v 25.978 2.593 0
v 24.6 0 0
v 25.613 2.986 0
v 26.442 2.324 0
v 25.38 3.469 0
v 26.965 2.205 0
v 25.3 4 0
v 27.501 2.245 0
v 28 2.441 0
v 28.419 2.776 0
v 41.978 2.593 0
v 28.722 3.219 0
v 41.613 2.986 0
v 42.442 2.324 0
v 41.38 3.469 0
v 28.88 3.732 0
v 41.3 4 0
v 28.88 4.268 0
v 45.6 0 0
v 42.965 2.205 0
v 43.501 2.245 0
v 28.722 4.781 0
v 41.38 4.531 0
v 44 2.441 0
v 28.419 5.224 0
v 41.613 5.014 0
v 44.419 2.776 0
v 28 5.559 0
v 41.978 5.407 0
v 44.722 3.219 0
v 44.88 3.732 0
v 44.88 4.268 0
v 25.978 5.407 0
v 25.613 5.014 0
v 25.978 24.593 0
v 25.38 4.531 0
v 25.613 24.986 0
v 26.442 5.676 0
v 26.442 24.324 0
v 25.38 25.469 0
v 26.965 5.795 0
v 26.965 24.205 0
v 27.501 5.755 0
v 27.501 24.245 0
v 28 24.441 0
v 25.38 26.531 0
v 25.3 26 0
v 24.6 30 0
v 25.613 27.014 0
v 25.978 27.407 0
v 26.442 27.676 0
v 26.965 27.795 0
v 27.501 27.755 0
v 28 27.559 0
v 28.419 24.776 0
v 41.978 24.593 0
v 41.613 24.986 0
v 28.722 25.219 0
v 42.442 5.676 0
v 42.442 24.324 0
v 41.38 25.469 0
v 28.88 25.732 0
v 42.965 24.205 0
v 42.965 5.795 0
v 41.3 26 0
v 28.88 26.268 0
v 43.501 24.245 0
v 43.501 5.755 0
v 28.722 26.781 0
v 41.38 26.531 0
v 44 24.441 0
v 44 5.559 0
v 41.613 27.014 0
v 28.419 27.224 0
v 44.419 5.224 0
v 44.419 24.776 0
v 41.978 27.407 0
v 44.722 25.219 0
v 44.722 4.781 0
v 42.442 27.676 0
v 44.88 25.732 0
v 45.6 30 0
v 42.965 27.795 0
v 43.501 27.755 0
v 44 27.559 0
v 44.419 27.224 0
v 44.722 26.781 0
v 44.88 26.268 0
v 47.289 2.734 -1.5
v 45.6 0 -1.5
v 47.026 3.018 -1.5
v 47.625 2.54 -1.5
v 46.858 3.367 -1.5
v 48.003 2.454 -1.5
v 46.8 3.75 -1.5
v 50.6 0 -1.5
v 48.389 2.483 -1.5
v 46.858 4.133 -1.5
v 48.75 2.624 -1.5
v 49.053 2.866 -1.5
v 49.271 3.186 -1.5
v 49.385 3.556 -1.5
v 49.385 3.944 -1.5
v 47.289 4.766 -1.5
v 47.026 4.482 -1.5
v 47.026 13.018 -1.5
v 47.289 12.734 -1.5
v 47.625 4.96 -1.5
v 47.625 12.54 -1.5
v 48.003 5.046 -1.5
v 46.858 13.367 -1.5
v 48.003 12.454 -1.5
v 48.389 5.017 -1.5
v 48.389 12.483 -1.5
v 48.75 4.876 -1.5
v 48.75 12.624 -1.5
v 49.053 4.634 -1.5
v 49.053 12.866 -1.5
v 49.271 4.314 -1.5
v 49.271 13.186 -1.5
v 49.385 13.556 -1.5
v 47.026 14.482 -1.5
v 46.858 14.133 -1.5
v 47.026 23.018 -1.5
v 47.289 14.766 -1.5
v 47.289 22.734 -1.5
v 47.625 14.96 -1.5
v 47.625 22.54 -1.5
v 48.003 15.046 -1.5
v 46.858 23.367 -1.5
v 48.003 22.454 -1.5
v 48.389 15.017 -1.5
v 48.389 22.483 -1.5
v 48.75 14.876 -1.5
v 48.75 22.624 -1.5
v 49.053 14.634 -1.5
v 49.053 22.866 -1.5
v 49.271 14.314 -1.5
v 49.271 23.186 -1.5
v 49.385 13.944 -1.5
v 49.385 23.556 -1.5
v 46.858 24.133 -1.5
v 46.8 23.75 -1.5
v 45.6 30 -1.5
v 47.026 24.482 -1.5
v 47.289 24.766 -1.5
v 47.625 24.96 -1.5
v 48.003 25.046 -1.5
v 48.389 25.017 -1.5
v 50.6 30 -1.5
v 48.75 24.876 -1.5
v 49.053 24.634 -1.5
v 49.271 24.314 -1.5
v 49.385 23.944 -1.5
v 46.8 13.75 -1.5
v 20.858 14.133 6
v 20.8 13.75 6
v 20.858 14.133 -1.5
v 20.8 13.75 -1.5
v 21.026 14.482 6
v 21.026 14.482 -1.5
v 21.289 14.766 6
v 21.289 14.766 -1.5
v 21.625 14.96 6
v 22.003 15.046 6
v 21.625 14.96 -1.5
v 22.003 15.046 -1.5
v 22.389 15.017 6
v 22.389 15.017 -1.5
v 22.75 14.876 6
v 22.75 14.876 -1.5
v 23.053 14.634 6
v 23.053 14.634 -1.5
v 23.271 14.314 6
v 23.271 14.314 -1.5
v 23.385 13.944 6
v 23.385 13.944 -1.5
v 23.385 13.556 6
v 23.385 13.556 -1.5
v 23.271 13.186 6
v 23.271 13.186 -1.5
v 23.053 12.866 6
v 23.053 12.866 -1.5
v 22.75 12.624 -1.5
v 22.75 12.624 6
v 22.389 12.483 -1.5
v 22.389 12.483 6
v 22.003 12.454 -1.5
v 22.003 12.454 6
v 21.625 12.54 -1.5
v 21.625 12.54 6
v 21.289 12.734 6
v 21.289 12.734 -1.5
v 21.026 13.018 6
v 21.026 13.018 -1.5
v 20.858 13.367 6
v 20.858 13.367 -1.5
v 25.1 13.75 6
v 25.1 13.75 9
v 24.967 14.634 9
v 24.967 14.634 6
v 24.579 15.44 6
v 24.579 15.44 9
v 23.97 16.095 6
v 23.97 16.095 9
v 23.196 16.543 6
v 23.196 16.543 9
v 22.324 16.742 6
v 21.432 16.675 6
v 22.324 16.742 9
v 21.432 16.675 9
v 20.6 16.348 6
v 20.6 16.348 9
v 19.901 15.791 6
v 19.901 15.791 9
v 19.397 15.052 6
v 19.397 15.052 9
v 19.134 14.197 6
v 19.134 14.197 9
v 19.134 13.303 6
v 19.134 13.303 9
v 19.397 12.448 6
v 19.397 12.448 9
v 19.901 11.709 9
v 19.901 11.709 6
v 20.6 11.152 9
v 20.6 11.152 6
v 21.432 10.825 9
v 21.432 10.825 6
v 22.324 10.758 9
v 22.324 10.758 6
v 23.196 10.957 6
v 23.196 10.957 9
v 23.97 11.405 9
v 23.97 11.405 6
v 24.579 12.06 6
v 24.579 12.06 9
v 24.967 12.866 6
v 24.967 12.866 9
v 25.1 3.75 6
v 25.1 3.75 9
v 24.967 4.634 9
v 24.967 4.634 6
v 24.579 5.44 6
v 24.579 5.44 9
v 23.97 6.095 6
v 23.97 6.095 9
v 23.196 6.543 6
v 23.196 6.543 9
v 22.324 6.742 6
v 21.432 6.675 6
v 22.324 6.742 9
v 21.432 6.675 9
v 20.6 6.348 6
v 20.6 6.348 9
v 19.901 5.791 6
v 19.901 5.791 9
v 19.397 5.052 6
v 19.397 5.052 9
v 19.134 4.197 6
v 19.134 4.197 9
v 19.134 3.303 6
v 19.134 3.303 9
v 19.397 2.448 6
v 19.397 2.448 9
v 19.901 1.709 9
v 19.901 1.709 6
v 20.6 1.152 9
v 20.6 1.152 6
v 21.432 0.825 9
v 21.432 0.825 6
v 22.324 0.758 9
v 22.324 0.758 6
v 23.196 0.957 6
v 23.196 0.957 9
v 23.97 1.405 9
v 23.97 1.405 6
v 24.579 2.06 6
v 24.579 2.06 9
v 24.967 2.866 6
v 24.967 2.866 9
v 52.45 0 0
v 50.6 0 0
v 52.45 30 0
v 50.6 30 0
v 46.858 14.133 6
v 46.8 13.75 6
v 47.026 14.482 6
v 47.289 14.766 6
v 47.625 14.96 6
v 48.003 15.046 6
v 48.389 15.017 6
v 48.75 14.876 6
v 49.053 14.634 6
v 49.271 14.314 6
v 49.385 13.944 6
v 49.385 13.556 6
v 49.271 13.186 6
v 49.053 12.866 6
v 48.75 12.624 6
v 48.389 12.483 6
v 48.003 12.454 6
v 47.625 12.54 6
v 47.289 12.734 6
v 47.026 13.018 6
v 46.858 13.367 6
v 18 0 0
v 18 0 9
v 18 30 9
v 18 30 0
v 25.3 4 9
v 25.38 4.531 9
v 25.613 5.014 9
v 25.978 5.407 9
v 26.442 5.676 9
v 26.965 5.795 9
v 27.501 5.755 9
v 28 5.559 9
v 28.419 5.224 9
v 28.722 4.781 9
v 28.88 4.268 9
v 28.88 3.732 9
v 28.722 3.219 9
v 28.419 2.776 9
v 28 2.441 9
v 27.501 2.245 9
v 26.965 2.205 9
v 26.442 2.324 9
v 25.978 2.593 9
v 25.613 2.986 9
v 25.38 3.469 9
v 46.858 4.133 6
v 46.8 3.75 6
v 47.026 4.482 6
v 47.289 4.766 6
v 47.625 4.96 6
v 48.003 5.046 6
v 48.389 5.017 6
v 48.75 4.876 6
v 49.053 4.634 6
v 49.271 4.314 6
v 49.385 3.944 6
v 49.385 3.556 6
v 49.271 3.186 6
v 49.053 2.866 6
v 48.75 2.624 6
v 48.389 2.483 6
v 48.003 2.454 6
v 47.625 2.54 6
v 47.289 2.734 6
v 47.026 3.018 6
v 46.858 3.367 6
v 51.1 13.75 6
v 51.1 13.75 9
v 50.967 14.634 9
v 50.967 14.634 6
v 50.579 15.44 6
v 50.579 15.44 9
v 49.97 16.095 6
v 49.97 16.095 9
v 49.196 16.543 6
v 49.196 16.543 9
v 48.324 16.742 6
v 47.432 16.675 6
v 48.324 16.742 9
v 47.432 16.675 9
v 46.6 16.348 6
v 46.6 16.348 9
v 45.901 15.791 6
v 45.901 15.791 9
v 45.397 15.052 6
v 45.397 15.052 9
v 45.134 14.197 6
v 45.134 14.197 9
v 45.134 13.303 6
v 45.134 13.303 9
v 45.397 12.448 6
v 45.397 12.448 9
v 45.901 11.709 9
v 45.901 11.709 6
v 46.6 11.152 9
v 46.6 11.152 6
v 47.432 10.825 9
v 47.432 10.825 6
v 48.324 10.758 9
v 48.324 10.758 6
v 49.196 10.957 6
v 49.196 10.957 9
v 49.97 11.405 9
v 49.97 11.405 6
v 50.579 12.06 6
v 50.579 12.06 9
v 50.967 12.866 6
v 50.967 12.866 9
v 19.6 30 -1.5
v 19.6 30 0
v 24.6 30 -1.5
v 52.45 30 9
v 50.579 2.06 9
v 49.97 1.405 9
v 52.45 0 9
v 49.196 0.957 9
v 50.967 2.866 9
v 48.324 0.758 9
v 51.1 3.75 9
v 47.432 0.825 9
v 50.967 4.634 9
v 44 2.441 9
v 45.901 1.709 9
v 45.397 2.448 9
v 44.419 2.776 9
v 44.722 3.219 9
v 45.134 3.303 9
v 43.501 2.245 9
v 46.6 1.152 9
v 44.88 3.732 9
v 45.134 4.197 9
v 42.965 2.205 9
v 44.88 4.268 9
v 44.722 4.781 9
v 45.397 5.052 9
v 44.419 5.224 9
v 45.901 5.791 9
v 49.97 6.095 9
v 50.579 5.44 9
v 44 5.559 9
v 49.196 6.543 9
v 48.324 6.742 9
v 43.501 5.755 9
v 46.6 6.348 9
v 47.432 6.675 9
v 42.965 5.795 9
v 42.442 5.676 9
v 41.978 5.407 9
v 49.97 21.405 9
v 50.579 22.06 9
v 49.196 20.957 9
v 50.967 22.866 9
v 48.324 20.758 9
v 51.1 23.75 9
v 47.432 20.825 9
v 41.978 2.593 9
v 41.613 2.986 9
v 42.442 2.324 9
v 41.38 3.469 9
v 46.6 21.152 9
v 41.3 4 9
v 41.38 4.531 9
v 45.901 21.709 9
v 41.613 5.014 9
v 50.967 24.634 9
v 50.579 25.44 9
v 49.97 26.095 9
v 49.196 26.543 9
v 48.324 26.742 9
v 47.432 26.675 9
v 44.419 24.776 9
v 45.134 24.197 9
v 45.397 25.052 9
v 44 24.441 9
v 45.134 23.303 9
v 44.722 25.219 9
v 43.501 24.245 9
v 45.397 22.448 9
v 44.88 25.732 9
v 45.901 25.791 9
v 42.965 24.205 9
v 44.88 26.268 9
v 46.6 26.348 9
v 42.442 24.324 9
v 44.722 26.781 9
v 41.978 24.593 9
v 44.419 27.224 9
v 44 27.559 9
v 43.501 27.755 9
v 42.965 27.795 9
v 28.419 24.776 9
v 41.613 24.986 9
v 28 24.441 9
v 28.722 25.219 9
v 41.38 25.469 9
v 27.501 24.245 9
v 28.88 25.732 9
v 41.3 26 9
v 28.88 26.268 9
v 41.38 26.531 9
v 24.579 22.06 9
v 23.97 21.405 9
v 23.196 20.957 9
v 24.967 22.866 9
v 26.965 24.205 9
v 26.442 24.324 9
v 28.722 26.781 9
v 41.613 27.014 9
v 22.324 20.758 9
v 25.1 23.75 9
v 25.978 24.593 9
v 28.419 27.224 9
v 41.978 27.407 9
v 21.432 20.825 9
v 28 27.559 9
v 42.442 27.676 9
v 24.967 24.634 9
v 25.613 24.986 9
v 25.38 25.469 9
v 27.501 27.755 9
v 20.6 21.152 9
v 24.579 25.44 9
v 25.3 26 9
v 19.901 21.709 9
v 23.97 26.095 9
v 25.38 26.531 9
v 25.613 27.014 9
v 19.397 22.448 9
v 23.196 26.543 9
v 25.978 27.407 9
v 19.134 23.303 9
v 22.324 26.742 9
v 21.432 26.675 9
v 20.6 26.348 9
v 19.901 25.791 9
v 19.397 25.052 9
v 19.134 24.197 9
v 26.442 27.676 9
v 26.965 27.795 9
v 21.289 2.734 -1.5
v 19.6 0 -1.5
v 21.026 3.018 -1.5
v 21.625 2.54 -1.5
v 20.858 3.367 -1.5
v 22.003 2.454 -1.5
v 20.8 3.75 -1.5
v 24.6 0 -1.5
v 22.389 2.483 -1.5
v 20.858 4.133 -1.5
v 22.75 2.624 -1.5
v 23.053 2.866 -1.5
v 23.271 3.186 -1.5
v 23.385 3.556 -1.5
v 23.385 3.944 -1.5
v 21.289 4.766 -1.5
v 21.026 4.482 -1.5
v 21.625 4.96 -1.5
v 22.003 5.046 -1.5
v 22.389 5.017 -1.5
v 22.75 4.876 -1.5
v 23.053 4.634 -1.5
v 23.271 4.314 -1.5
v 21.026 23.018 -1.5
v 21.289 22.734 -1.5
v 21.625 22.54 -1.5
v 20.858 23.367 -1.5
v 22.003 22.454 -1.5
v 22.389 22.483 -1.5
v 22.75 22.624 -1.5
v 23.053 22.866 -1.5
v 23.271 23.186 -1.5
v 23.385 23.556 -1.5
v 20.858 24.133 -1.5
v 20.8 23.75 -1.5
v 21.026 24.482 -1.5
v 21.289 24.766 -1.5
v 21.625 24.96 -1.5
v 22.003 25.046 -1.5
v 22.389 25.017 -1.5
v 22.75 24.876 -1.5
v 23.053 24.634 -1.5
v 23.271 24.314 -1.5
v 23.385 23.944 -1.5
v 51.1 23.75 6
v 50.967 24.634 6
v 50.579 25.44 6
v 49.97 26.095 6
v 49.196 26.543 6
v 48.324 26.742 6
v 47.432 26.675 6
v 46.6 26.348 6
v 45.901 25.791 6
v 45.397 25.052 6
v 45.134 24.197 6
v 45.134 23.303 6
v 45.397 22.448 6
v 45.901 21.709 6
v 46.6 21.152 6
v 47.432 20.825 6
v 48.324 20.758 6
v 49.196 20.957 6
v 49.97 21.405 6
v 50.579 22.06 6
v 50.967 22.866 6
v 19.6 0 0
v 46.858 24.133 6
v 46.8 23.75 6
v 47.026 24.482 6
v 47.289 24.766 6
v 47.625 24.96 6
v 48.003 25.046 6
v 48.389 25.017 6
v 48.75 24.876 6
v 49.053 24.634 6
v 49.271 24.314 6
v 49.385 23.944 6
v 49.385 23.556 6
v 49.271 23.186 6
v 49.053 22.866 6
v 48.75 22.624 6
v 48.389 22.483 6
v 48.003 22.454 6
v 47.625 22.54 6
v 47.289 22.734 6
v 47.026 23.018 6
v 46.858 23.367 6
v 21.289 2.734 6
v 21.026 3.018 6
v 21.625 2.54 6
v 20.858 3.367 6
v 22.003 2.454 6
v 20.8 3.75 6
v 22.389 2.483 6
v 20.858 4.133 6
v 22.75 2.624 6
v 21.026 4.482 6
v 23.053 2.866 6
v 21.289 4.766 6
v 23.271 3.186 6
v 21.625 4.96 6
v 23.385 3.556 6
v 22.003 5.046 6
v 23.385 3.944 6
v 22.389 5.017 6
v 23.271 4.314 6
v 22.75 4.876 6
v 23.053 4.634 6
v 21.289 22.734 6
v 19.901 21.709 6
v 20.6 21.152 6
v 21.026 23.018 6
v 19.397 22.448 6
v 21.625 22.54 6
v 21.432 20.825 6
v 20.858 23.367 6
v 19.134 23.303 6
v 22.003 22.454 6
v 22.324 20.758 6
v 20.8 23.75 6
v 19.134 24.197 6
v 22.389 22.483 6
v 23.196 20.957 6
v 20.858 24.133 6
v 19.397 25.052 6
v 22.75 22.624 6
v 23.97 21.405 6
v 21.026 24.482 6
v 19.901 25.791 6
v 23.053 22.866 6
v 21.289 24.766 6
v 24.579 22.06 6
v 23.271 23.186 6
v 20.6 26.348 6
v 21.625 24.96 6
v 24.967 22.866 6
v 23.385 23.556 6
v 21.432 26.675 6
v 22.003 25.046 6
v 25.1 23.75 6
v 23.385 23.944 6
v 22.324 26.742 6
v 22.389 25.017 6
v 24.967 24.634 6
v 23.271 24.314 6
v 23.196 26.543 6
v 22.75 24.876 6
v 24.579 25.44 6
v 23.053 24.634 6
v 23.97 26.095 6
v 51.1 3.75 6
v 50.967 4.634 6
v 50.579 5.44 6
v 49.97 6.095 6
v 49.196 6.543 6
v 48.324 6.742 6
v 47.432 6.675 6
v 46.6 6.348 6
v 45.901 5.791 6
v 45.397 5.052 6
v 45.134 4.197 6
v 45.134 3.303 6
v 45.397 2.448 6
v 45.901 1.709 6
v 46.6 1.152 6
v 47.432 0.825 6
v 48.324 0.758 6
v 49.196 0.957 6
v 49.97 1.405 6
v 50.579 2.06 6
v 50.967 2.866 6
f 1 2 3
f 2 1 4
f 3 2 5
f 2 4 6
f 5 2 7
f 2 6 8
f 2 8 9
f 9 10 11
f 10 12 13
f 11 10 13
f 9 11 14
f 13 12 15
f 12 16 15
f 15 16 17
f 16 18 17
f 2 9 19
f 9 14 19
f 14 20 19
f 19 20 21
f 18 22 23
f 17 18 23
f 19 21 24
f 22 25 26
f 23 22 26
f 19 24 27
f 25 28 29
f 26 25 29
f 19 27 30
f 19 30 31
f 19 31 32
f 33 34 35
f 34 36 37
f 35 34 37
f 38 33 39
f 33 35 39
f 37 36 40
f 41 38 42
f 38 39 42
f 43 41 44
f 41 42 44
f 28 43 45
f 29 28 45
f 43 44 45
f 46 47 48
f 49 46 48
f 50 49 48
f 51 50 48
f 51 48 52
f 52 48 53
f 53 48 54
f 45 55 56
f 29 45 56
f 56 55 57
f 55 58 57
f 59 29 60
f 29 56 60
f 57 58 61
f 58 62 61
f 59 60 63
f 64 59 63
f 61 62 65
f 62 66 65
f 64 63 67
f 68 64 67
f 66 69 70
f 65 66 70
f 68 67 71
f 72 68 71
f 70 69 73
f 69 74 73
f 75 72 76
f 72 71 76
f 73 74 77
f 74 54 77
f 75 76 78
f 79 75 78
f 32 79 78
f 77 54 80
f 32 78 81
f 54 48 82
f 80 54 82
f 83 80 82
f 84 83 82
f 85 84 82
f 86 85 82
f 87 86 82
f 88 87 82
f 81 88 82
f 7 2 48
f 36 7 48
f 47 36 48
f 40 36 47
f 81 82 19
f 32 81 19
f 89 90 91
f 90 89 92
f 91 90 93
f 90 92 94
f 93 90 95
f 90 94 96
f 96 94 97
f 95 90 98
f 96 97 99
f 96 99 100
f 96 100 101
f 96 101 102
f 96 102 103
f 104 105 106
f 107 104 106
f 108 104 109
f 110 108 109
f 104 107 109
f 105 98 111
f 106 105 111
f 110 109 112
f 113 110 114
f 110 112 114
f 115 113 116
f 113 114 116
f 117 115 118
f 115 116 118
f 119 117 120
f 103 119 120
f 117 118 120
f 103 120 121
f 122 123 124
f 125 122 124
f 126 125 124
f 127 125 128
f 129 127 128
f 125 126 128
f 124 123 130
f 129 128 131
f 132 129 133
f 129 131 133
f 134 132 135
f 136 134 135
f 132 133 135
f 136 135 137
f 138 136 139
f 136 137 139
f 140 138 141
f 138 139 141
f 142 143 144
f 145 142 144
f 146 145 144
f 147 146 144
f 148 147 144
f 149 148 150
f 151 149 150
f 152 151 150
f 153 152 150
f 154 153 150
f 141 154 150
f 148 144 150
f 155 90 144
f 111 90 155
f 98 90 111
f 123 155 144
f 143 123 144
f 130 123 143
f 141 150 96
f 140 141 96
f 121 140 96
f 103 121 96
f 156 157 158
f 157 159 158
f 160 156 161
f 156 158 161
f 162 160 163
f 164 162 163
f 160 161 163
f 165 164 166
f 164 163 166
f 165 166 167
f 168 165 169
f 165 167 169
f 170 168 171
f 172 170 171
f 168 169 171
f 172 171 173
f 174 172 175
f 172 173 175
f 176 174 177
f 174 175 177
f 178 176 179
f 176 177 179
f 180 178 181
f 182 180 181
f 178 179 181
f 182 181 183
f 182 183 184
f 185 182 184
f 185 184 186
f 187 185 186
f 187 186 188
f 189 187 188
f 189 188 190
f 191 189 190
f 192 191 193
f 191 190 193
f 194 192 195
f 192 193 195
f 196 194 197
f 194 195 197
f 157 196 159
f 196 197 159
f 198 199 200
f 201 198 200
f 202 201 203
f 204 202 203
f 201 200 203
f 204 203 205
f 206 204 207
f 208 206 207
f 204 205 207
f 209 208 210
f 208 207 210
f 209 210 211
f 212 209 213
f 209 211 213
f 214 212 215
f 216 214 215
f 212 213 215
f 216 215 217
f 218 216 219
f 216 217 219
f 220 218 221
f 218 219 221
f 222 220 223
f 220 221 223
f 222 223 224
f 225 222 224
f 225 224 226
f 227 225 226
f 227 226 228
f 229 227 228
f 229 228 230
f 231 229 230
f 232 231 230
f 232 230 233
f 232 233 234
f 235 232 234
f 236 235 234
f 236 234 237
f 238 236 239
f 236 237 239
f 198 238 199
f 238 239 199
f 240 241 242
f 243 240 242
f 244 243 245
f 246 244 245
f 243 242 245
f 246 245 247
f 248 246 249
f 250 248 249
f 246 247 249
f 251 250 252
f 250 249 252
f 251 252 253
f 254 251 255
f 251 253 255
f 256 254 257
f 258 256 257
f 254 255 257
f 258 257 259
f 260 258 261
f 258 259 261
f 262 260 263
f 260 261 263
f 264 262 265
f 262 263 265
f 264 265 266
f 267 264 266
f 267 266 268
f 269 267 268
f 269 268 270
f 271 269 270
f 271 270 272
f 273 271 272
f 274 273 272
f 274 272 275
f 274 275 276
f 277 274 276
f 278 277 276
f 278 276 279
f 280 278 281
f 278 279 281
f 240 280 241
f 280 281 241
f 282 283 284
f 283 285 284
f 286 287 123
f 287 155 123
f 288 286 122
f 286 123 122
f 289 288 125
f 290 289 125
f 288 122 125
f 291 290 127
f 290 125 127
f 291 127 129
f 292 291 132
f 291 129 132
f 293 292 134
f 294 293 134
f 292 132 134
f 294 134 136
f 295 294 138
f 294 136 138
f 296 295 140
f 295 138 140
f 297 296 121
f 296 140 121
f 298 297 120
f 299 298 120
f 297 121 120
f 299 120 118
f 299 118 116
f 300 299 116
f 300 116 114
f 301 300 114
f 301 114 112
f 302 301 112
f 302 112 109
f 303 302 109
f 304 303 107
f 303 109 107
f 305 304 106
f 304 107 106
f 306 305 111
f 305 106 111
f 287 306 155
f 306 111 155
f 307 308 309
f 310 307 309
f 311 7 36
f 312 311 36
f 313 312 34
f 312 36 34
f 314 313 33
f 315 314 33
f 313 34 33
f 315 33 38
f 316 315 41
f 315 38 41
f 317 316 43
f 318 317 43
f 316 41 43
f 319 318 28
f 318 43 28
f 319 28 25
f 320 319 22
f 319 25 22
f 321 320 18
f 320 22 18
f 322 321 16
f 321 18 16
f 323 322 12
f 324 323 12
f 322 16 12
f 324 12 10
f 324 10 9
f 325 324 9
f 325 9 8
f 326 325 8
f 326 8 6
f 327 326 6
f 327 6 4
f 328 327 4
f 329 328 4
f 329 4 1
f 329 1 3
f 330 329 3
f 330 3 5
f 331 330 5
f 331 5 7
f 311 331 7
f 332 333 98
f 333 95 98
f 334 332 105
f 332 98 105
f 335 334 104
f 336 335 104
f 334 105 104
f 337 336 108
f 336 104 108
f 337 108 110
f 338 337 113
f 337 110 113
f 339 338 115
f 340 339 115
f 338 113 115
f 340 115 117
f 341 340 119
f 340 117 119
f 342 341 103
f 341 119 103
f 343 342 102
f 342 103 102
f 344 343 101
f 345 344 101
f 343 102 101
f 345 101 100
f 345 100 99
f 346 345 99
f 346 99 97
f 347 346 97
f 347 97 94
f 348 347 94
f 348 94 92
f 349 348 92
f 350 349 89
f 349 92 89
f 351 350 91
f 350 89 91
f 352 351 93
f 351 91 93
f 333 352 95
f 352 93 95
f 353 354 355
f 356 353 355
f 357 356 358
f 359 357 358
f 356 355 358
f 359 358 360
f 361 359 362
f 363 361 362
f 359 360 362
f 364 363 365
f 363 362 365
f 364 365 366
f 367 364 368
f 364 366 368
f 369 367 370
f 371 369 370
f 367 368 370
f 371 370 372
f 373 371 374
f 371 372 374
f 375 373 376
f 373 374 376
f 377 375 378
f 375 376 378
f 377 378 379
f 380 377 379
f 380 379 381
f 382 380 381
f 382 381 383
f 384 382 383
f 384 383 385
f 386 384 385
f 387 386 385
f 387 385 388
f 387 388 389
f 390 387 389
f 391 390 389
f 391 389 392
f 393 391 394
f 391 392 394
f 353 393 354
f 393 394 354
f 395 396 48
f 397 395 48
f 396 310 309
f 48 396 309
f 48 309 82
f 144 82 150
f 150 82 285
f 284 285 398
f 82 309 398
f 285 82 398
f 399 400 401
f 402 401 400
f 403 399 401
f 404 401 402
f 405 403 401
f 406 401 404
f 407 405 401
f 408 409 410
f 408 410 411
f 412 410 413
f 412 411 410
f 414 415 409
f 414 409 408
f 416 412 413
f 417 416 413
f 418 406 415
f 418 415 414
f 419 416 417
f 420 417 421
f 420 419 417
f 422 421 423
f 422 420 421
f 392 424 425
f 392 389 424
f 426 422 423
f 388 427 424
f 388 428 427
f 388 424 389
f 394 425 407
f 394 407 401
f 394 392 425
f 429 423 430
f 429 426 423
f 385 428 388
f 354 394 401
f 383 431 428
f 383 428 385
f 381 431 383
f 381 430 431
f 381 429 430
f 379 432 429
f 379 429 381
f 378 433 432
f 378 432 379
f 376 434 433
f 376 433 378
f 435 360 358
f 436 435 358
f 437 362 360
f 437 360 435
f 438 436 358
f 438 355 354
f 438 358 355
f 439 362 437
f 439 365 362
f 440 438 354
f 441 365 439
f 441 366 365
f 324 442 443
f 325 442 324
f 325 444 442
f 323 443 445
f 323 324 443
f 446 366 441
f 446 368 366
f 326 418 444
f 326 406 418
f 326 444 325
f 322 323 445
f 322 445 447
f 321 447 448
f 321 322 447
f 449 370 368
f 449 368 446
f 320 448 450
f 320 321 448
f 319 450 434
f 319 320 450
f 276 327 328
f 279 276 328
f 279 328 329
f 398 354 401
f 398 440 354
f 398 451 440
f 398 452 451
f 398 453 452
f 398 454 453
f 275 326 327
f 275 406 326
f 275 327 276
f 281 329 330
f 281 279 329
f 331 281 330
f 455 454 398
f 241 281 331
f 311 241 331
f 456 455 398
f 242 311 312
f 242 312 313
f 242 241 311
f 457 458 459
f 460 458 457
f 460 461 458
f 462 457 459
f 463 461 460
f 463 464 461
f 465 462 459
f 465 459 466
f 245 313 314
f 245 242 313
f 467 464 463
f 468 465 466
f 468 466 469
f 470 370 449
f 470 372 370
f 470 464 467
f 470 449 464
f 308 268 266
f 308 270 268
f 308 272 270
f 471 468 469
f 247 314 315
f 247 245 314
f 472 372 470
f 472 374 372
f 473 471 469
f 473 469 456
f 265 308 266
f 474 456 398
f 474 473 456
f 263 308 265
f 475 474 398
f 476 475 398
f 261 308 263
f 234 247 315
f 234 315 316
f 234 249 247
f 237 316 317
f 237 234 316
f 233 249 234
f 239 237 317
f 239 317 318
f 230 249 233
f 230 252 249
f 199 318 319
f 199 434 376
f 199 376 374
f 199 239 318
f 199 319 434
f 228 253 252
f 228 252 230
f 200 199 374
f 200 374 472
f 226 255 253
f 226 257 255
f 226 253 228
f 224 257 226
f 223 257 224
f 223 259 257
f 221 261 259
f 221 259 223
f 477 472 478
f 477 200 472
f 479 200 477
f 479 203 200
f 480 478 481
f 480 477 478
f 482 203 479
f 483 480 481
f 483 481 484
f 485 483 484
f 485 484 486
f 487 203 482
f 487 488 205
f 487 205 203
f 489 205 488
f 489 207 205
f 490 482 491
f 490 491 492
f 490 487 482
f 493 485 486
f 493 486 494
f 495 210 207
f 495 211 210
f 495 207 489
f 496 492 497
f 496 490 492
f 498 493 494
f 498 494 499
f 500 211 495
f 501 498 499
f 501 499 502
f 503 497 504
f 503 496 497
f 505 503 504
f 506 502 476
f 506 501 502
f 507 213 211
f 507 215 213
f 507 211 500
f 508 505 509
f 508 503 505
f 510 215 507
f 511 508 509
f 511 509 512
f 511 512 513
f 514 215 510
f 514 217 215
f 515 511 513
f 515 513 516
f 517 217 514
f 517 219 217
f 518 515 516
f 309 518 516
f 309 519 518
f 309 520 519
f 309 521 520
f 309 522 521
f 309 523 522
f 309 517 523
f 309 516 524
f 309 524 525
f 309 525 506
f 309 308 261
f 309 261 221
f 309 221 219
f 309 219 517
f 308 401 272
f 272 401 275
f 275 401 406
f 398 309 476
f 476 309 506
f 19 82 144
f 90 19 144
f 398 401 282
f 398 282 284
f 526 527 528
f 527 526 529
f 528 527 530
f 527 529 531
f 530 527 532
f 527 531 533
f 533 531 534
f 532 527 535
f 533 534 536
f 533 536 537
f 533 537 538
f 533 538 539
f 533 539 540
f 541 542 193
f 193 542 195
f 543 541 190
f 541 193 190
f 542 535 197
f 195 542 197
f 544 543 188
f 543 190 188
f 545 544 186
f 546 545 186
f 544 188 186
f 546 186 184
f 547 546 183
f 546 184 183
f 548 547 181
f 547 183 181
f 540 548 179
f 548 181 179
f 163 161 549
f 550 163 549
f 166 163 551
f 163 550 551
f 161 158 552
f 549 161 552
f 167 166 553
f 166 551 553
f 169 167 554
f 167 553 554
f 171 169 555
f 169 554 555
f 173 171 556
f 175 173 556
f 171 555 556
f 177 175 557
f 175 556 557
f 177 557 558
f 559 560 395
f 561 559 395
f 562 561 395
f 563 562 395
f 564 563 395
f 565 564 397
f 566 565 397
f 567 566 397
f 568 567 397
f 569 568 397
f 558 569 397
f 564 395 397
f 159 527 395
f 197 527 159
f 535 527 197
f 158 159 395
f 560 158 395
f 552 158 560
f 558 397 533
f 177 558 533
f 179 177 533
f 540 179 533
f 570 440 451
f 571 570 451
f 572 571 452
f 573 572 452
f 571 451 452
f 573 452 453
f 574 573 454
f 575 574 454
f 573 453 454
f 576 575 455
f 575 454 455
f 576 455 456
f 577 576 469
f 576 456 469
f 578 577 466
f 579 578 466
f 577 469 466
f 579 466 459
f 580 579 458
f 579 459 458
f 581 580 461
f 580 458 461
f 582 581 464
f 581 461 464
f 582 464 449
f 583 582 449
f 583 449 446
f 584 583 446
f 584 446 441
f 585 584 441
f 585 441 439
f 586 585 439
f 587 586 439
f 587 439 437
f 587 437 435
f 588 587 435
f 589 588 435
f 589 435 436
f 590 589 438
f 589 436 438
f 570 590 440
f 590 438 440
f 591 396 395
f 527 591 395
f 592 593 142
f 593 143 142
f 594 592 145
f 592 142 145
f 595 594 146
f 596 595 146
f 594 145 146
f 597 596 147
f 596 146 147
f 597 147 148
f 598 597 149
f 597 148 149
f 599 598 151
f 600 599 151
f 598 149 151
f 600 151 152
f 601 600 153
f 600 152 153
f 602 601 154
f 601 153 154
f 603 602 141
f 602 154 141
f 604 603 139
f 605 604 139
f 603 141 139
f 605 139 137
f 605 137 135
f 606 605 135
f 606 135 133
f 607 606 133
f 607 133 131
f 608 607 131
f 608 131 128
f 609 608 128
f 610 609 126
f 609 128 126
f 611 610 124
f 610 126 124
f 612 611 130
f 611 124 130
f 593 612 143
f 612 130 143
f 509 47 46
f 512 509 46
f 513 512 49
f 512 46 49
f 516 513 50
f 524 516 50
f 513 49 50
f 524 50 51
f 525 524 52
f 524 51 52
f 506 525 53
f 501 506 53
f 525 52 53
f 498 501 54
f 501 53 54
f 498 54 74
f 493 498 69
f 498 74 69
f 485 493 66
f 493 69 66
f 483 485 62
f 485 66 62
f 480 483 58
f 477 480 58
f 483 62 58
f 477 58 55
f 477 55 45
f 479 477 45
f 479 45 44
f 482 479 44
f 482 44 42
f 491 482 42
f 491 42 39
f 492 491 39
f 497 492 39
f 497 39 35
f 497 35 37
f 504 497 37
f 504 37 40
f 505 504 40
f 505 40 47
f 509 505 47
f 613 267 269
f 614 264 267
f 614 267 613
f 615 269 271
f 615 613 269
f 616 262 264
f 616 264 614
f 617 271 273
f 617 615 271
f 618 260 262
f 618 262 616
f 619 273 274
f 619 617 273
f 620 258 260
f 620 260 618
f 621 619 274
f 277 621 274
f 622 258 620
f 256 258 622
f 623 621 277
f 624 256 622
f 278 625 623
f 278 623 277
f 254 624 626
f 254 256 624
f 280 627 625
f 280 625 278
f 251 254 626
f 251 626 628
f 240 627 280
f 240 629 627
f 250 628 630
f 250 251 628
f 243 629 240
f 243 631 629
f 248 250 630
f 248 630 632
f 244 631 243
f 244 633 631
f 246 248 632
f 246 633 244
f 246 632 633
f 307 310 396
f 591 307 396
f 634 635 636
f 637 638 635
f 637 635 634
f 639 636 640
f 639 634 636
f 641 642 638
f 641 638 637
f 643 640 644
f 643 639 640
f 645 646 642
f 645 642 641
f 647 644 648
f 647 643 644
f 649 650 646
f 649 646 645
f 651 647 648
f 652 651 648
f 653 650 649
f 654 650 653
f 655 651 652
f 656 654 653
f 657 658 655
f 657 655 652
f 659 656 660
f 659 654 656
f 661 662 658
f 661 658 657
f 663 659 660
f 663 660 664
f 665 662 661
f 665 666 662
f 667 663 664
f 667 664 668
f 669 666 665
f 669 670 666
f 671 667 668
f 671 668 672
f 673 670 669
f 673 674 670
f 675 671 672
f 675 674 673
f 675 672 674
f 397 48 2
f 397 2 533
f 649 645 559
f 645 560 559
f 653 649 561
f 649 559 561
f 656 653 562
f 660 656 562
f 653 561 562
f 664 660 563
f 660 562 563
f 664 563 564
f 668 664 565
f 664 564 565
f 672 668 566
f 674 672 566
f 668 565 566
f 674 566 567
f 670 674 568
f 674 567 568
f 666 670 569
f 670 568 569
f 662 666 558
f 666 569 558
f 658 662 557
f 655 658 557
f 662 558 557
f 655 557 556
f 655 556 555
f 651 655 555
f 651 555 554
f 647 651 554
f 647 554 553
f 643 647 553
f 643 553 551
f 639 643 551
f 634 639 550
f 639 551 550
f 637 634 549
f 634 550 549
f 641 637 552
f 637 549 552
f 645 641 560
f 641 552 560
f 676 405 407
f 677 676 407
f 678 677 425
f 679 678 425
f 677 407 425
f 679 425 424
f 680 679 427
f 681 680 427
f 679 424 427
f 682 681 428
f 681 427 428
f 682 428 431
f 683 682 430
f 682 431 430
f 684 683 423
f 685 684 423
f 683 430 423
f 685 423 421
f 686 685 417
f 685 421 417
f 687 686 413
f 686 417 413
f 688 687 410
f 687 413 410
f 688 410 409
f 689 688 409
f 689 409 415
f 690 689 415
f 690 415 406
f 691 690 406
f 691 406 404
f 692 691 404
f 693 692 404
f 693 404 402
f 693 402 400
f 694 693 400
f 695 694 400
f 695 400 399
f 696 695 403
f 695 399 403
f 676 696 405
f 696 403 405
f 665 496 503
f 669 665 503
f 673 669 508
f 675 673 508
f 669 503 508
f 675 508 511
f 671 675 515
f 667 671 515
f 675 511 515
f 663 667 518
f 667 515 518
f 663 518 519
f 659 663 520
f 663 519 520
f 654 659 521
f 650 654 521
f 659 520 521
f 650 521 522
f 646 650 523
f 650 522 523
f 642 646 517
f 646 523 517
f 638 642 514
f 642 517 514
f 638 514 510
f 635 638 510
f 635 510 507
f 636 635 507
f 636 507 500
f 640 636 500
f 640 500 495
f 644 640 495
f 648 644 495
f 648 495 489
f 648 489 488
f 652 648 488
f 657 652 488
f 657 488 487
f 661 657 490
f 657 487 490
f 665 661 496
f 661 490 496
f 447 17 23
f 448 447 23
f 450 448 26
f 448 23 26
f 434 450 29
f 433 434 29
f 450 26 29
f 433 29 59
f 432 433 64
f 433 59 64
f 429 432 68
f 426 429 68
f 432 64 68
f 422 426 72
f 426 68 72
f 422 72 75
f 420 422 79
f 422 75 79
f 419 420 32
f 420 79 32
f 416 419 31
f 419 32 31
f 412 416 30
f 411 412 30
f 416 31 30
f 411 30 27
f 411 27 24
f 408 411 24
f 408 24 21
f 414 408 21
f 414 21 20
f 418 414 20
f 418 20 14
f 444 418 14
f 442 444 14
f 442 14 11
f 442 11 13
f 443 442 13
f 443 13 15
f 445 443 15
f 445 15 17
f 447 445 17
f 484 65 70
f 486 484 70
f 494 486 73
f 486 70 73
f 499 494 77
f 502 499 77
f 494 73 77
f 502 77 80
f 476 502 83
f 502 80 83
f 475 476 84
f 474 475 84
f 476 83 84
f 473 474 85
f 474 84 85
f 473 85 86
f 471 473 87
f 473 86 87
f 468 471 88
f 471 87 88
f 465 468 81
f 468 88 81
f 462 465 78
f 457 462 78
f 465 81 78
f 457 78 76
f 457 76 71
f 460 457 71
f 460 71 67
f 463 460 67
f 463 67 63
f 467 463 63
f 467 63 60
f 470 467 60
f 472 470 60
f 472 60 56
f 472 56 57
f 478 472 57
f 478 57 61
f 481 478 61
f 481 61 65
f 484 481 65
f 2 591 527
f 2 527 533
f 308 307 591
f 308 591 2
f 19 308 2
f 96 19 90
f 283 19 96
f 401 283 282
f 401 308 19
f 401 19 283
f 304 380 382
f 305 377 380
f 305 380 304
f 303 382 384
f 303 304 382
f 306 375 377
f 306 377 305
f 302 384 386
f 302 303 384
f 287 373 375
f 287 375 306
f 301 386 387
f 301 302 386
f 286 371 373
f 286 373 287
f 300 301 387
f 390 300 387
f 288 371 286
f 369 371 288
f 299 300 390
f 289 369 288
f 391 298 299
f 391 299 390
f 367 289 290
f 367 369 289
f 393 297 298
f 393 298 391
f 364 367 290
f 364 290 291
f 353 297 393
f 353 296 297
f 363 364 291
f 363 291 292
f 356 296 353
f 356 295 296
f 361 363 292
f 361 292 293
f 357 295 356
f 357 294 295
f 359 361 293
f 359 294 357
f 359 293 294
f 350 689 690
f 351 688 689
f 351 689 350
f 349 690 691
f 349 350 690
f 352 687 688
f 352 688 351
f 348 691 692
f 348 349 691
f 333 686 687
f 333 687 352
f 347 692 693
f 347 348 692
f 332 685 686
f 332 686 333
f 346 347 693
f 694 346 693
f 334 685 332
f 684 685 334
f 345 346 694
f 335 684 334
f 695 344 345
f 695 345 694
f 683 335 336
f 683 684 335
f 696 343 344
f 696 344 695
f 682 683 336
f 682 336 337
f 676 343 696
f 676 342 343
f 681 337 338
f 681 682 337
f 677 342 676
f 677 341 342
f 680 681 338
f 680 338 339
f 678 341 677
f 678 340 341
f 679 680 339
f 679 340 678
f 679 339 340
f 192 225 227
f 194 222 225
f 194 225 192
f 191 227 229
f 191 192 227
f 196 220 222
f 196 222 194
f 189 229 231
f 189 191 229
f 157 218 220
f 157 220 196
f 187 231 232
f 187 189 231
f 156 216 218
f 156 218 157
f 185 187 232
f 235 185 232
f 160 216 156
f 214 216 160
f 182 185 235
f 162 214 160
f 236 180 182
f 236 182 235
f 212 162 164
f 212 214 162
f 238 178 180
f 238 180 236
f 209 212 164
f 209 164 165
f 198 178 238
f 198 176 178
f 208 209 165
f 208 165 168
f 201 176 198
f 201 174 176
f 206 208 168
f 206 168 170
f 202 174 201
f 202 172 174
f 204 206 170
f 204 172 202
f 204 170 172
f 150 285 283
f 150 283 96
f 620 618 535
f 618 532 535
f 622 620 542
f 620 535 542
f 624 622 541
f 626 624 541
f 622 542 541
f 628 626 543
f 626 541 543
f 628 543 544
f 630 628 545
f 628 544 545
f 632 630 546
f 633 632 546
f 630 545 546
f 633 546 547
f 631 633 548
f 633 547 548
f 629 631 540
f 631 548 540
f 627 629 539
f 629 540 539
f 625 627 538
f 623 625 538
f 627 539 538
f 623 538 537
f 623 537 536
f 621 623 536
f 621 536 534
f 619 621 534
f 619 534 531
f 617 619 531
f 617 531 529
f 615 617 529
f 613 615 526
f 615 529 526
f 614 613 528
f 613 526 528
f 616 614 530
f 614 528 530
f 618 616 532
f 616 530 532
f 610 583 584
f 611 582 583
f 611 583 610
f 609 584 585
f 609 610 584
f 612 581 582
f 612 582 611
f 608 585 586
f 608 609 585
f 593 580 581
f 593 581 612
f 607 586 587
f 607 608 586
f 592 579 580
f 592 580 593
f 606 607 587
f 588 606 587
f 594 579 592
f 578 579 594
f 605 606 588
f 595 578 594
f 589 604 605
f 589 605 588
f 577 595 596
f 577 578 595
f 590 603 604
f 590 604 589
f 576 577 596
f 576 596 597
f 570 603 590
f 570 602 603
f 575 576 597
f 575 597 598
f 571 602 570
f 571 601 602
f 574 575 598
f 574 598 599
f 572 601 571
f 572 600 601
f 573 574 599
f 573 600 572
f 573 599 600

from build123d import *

# Parameters (mm, degrees)
SKETCH_1_W           = 70
SKETCH_1_H           = 30
EXTRUDE_1_DEPTH      = 9
SKETCH_2_W           = 112.1
SKETCH_2_H           = 30
EXTRUDE_2_DEPTH      = 8
SKETCH_3_W           = 42.6
SKETCH_3_H           = 30
EXTRUDE_3_DEPTH      = 8
SKETCH_5_W           = 18.5
SKETCH_5_H           = 30
SKETCH_5_R           = 2
EXTRUDE_4_DEPTH      = 5.5
SKETCH_11_R          = 2
CUT_EXTRUDE_4_DEPTH  = 8
SKETCH_12_R          = 1.8
CUT_EXTRUDE_6_DEPTH  = 8
SKETCH_13_R          = 2
CUT_EXTRUDE_7_DEPTH  = 8
SKETCH_14_R          = 2
CUT_EXTRUDE_8_DEPTH  = 10
SKETCH_19_W          = 5
SKETCH_19_H          = 9
EXTRUDE_6_DEPTH      = 36.25
SKETCH_20_W          = 5
SKETCH_20_H          = 6.25
EXTRUDE_7_DEPTH      = 9
SKETCH_21_R          = 1.3
CUT_EXTRUDE_10_DEPTH = 9
SKETCH_25_W          = 5
SKETCH_25_H          = 1.5
EXTRUDE_8_DEPTH      = 42.5
SKETCH_26_R          = 1.3
CUT_EXTRUDE_14_DEPTH = 1.5
SKETCH_27_W          = 5
SKETCH_27_H          = 6.25
CUT_EXTRUDE_15_DEPTH = 11
SKETCH_28_R          = 3
CUT_EXTRUDE_16_DEPTH = 3
SKETCH_29_W          = 8
SKETCH_29_H          = 103.1
SKETCH_29_W_2        = 10.5
SKETCH_29_H_2        = 5.5
CUT_EXTRUDE_17_DEPTH = 30
SKETCH_30_R          = 1.8
CUT_EXTRUDE_18_DEPTH = 10
SKETCH_31_R          = 3.6
CUT_EXTRUDE_19_DEPTH = 3
SKETCH_32_R          = 1.8
CUT_EXTRUDE_20_DEPTH = 10
SKETCH_33_R          = 3.6
CUT_EXTRUDE_21_DEPTH = 3
CUT_EXTRUDE_22_REACH = 86.054
SKETCH_35_R          = 1.8
SKETCH_36_W          = 7.55
SKETCH_36_H          = 30
CUT_EXTRUDE_23_DEPTH = 10
SKETCH_37_W          = 18
SKETCH_37_H          = 30
SKETCH_37_W_2        = 26
CUT_EXTRUDE_24_DEPTH = 10


with BuildPart() as part:
    # 草圖1 → 填料-伸長1 (new body)
    with BuildSketch(Plane.XY):
        with Locations((35, 15)):
            Rectangle(SKETCH_1_W, SKETCH_1_H)
    extrude(amount=EXTRUDE_1_DEPTH)

    # 草圖2 → 填料-伸長2 (add)
    with BuildSketch(Plane.ZY):
        with Locations((-47.05, 15)):
            Rectangle(SKETCH_2_W, SKETCH_2_H)
    extrude(amount=EXTRUDE_2_DEPTH)

    # 草圖3 → 填料-伸長3 (add)
    with BuildSketch(Plane(origin=(70, 0, 0), x_dir=(0, 0, -1), z_dir=(1, 0, 0))):
        with Locations((12.3, 15)):
            Rectangle(SKETCH_3_W, SKETCH_3_H)
    extrude(amount=EXTRUDE_3_DEPTH)

    # 草圖5 → 填料-伸長4 (add)
    with BuildSketch(Plane(origin=(0, 0, -33.6), x_dir=(-1, 0, 0), z_dir=(0, 0, -1))):
        with Locations((-68.75, 15)):
            Rectangle(SKETCH_5_W, SKETCH_5_H)
        with Locations(Location((-65.75, 26, 0), (0, 0, 90))):
            Circle(SKETCH_5_R, mode=Mode.SUBTRACT)
        with Locations(Location((-65.75, 18, 0), (0, 0, 90))):
            Circle(SKETCH_5_R, mode=Mode.SUBTRACT)
        with Locations(Location((-65.75, 10, 0), (0, 0, 90))):
            Circle(SKETCH_5_R, mode=Mode.SUBTRACT)
    extrude(amount=EXTRUDE_4_DEPTH)

    # 草圖11 → 除料-伸長4 (cut)
    with BuildSketch(Plane.ZY.offset(8)):
        with Locations((-23, 23)):
            Circle(SKETCH_11_R)
        with Locations((-23, 15)):
            Circle(SKETCH_11_R)
        with Locations((-23, 7)):
            Circle(SKETCH_11_R)
        with Locations((-15, 23)):
            Circle(SKETCH_11_R)
        with Locations((-15, 15)):
            Circle(SKETCH_11_R)
        with Locations((-15, 7)):
            Circle(SKETCH_11_R)
        with Locations((-7, 23)):
            Circle(SKETCH_11_R)
        with Locations((-7, 15)):
            Circle(SKETCH_11_R)
        with Locations((-7, 7)):
            Circle(SKETCH_11_R)
    extrude(amount=-CUT_EXTRUDE_4_DEPTH, mode=Mode.SUBTRACT)

    # 草圖12 → 除料-伸長6 (cut)
    with BuildSketch(Plane(origin=(0, 0, -103.1), x_dir=(-1, 0, 0), z_dir=(0, 0, -1))):
        with Locations((3, 23)):
            Circle(SKETCH_12_R)
        with Locations((3, 15)):
            Circle(SKETCH_12_R)
        with Locations((3, 7)):
            Circle(SKETCH_12_R)
    extrude(amount=-CUT_EXTRUDE_6_DEPTH, mode=Mode.SUBTRACT)

    # 草圖13 → 除料-伸長7 (cut)
    with BuildSketch(Plane(origin=(78, 0, 0), x_dir=(0, 0, -1), z_dir=(1, 0, 0))):
        with Locations((9.1, 23)):
            Circle(SKETCH_13_R)
        with Locations((9.1, 15)):
            Circle(SKETCH_13_R)
        with Locations((9.1, 7)):
            Circle(SKETCH_13_R)
        with Locations((17.1, 23)):
            Circle(SKETCH_13_R)
        with Locations((17.1, 15)):
            Circle(SKETCH_13_R)
        with Locations((17.1, 7)):
            Circle(SKETCH_13_R)
        with Locations((25.1, 23)):
            Circle(SKETCH_13_R)
        with Locations((25.1, 15)):
            Circle(SKETCH_13_R)
        with Locations((25.1, 7)):
            Circle(SKETCH_13_R)
    extrude(amount=-CUT_EXTRUDE_7_DEPTH, mode=Mode.SUBTRACT)

    # 草圖14 → 除料-伸長8 (cut)
    with BuildSketch(Plane.ZY.offset(8)):
        with Locations((-85.1, 23)):
            Circle(SKETCH_14_R)
        with Locations((-85.1, 15)):
            Circle(SKETCH_14_R)
        with Locations((-85.1, 7)):
            Circle(SKETCH_14_R)
        with Locations((-77.1, 23)):
            Circle(SKETCH_14_R)
        with Locations((-77.1, 15)):
            Circle(SKETCH_14_R)
        with Locations((-77.1, 7)):
            Circle(SKETCH_14_R)
        with Locations((-69.1, 23)):
            Circle(SKETCH_14_R)
        with Locations((-69.1, 15)):
            Circle(SKETCH_14_R)
        with Locations((-69.1, 7)):
            Circle(SKETCH_14_R)
        with Locations((-61.1, 23)):
            Circle(SKETCH_14_R)
        with Locations((-61.1, 15)):
            Circle(SKETCH_14_R)
        with Locations((-61.1, 7)):
            Circle(SKETCH_14_R)
    extrude(amount=-CUT_EXTRUDE_8_DEPTH, mode=Mode.SUBTRACT)

    # 草圖19 → 填料-伸長6 (add)
    with BuildSketch(Plane(origin=(0, 30, 0), x_dir=(1, 0, 0), z_dir=(0, 1, 0))):
        with Locations((22.1, -4.5)):
            Rectangle(SKETCH_19_W, SKETCH_19_H)
        with Locations((48.1, -4.5)):
            Rectangle(SKETCH_19_W, SKETCH_19_H)
    extrude(amount=-EXTRUDE_6_DEPTH)

    # 草圖20 → 填料-伸長7 (add)
    with BuildSketch(Plane(origin=(0, 0, 0), x_dir=(-1, 0, 0), z_dir=(0, 0, -1))):
        with Locations((-48.1, 33.125)):
            Rectangle(SKETCH_20_W, SKETCH_20_H)
        with Locations((-22.1, 33.125)):
            Rectangle(SKETCH_20_W, SKETCH_20_H)
    extrude(amount=-EXTRUDE_7_DEPTH)

    # 草圖21 → 除料-伸長10 (cut)
    with BuildSketch(Plane(origin=(0, 0, 0), x_dir=(-1, 0, 0), z_dir=(0, 0, -1))):
        with Locations((-48.1, 23.75)):
            Circle(SKETCH_21_R)
        with Locations((-48.1, 13.75)):
            Circle(SKETCH_21_R)
        with Locations((-48.1, 3.75)):
            Circle(SKETCH_21_R)
        with Locations((-22.1, 23.75)):
            Circle(SKETCH_21_R)
        with Locations((-22.1, 13.75)):
            Circle(SKETCH_21_R)
        with Locations((-22.1, 3.75)):
            Circle(SKETCH_21_R)
    extrude(amount=-CUT_EXTRUDE_10_DEPTH, mode=Mode.SUBTRACT)

    # 草圖25 → 填料-伸長8 (add)
    with BuildSketch(Plane(origin=(0, 36.25, 0), x_dir=(1, 0, 0), z_dir=(0, 1, 0))):
        with Locations((22.1, 0.75)):
            Rectangle(SKETCH_25_W, SKETCH_25_H)
        with Locations((48.1, 0.75)):
            Rectangle(SKETCH_25_W, SKETCH_25_H)
    extrude(amount=-EXTRUDE_8_DEPTH)

    # 草圖26 → 除料-伸長14 (cut)
    with BuildSketch(Plane(origin=(0, 0, -1.5), x_dir=(-1, 0, 0), z_dir=(0, 0, -1))):
        with Locations((-48.1, 23.75)):
            Circle(SKETCH_26_R)
        with Locations((-48.1, 13.75)):
            Circle(SKETCH_26_R)
        with Locations((-48.1, 3.75)):
            Circle(SKETCH_26_R)
        with Locations((-22.1, 23.75)):
            Circle(SKETCH_26_R)
        with Locations((-22.1, 13.75)):
            Circle(SKETCH_26_R)
        with Locations((-22.1, 3.75)):
            Circle(SKETCH_26_R)
    extrude(amount=-CUT_EXTRUDE_14_DEPTH, mode=Mode.SUBTRACT)

    # 草圖27 → 除料-伸長15 (cut)
    with BuildSketch(Plane.XY.offset(9)):
        with Locations((22.1, 33.125)):
            Rectangle(SKETCH_27_W, SKETCH_27_H)
        with Locations((48.1, 33.125)):
            Rectangle(SKETCH_27_W, SKETCH_27_H)
        with Locations((22.1, -3.125)):
            Rectangle(SKETCH_27_W, SKETCH_27_H)
        with Locations((48.1, -3.125)):
            Rectangle(SKETCH_27_W, SKETCH_27_H)
    extrude(amount=-CUT_EXTRUDE_15_DEPTH, mode=Mode.SUBTRACT)

    # 草圖28 → 除料-伸長16 (cut)
    with BuildSketch(Plane.XY.offset(9)):
        with Locations((22.1, 23.75)):
            Circle(SKETCH_28_R)
        with Locations((22.1, 13.75)):
            Circle(SKETCH_28_R)
        with Locations((22.1, 3.75)):
            Circle(SKETCH_28_R)
        with Locations((48.1, 13.75)):
            Circle(SKETCH_28_R)
        with Locations((48.1, 3.75)):
            Circle(SKETCH_28_R)
        with Locations((48.1, 23.75)):
            Circle(SKETCH_28_R)
    extrude(amount=-CUT_EXTRUDE_16_DEPTH, mode=Mode.SUBTRACT)

    # 草圖29 → 除料-伸長17 (cut)
    with BuildSketch(Plane(origin=(0, 30, 0), x_dir=(1, 0, 0), z_dir=(0, 1, 0))):
        with Locations((-4, 51.55)):
            Rectangle(SKETCH_29_W, SKETCH_29_H)
        with Locations((64.75, 36.35)):
            Rectangle(SKETCH_29_W_2, SKETCH_29_H_2)
        Polygon((70, 33.6), (70, 0), (78, 0), (78, 39.1), (70, 39.1), align=None)
    extrude(amount=-CUT_EXTRUDE_17_DEPTH, mode=Mode.SUBTRACT)

    # 草圖30 → 除料-伸長18 (cut)
    with BuildSketch(Plane.XY.offset(9)):
        with Locations((-4, 23)):
            Circle(SKETCH_30_R)
        with Locations((-4, 15)):
            Circle(SKETCH_30_R)
        with Locations((-4, 7)):
            Circle(SKETCH_30_R)
    extrude(amount=-CUT_EXTRUDE_18_DEPTH, mode=Mode.SUBTRACT)

    # 草圖31 → 除料-伸長19 (cut)
    with BuildSketch(Plane.XY.offset(9)):
        with Locations((-4, 15)):
            Circle(SKETCH_31_R)
        with Locations((-4, 7)):
            Circle(SKETCH_31_R)
        with Locations((-4, 23)):
            Circle(SKETCH_31_R)
    extrude(amount=-CUT_EXTRUDE_19_DEPTH, mode=Mode.SUBTRACT)

    # 草圖32 → 除料-伸長20 (cut)
    with BuildSketch(Plane.XY.offset(9)):
        with Locations((65.2, 23)):
            Circle(SKETCH_32_R)
        with Locations((65.2, 15)):
            Circle(SKETCH_32_R)
        with Locations((65.2, 7)):
            Circle(SKETCH_32_R)
    extrude(amount=-CUT_EXTRUDE_20_DEPTH, mode=Mode.SUBTRACT)

    # 草圖33 → 除料-伸長21 (cut)
    with BuildSketch(Plane.XY.offset(9)):
        with Locations((65.2, 23)):
            Circle(SKETCH_33_R)
        with Locations((65.2, 15)):
            Circle(SKETCH_33_R)
        with Locations((65.2, 7)):
            Circle(SKETCH_33_R)
    extrude(amount=-CUT_EXTRUDE_21_DEPTH, mode=Mode.SUBTRACT)

    # 草圖35 → 除料-伸長22 (cut, up to next)
    with BuildSketch(Plane(origin=(0, 0, 0), x_dir=(-1, 0, 0), z_dir=(0, 0, -1)), mode=Mode.PRIVATE) as cut_extrude_22_sk1:
        with Locations((-43.1, 4)):
            Circle(SKETCH_35_R)
    cut_extrude_22_tool1 = extrude(cut_extrude_22_sk1.sketch, amount=-CUT_EXTRUDE_22_REACH, mode=Mode.PRIVATE) & part.part
    # 草圖35 → 除料-伸長22 (cut, up to next)
    with BuildSketch(Plane(origin=(0, 0, 0), x_dir=(-1, 0, 0), z_dir=(0, 0, -1)), mode=Mode.PRIVATE) as cut_extrude_22_sk2:
        with Locations((-43.1, 26)):
            Circle(SKETCH_35_R)
    cut_extrude_22_tool2 = extrude(cut_extrude_22_sk2.sketch, amount=-CUT_EXTRUDE_22_REACH, mode=Mode.PRIVATE) & part.part
    # 草圖35 → 除料-伸長22 (cut, up to next)
    with BuildSketch(Plane(origin=(0, 0, 0), x_dir=(-1, 0, 0), z_dir=(0, 0, -1)), mode=Mode.PRIVATE) as cut_extrude_22_sk3:
        with Locations((-27.1, 26)):
            Circle(SKETCH_35_R)
    cut_extrude_22_tool3 = extrude(cut_extrude_22_sk3.sketch, amount=-CUT_EXTRUDE_22_REACH, mode=Mode.PRIVATE) & part.part
    # 草圖35 → 除料-伸長22 (cut, up to next)
    with BuildSketch(Plane(origin=(0, 0, 0), x_dir=(-1, 0, 0), z_dir=(0, 0, -1)), mode=Mode.PRIVATE) as cut_extrude_22_sk4:
        with Locations((-27.1, 4)):
            Circle(SKETCH_35_R)
    cut_extrude_22_tool4 = extrude(cut_extrude_22_sk4.sketch, amount=-CUT_EXTRUDE_22_REACH, mode=Mode.PRIVATE) & part.part
    add(cut_extrude_22_tool1.solids().sort_by_distance((43.1, 4, 0))[0], mode=Mode.SUBTRACT)
    add(cut_extrude_22_tool2.solids().sort_by_distance((43.1, 26, 0))[0], mode=Mode.SUBTRACT)
    add(cut_extrude_22_tool3.solids().sort_by_distance((27.1, 26, 0))[0], mode=Mode.SUBTRACT)
    add(cut_extrude_22_tool4.solids().sort_by_distance((27.1, 4, 0))[0], mode=Mode.SUBTRACT)

    # 草圖36 → 除料-伸長23 (cut)
    with BuildSketch(Plane.XY.offset(9)):
        with Locations((74.225, 15)):
            Rectangle(SKETCH_36_W, SKETCH_36_H)
    extrude(amount=-CUT_EXTRUDE_23_DEPTH, mode=Mode.SUBTRACT)

    # 草圖37 → 除料-伸長24 (cut)
    with BuildSketch(Plane.XY.offset(9)):
        with Locations((61.45, 15)):
            Rectangle(SKETCH_37_W, SKETCH_37_H)
        with Locations((5, 15)):
            Rectangle(SKETCH_37_W_2, SKETCH_37_H)
    extrude(amount=-CUT_EXTRUDE_24_DEPTH, mode=Mode.SUBTRACT)


solid = part.part
